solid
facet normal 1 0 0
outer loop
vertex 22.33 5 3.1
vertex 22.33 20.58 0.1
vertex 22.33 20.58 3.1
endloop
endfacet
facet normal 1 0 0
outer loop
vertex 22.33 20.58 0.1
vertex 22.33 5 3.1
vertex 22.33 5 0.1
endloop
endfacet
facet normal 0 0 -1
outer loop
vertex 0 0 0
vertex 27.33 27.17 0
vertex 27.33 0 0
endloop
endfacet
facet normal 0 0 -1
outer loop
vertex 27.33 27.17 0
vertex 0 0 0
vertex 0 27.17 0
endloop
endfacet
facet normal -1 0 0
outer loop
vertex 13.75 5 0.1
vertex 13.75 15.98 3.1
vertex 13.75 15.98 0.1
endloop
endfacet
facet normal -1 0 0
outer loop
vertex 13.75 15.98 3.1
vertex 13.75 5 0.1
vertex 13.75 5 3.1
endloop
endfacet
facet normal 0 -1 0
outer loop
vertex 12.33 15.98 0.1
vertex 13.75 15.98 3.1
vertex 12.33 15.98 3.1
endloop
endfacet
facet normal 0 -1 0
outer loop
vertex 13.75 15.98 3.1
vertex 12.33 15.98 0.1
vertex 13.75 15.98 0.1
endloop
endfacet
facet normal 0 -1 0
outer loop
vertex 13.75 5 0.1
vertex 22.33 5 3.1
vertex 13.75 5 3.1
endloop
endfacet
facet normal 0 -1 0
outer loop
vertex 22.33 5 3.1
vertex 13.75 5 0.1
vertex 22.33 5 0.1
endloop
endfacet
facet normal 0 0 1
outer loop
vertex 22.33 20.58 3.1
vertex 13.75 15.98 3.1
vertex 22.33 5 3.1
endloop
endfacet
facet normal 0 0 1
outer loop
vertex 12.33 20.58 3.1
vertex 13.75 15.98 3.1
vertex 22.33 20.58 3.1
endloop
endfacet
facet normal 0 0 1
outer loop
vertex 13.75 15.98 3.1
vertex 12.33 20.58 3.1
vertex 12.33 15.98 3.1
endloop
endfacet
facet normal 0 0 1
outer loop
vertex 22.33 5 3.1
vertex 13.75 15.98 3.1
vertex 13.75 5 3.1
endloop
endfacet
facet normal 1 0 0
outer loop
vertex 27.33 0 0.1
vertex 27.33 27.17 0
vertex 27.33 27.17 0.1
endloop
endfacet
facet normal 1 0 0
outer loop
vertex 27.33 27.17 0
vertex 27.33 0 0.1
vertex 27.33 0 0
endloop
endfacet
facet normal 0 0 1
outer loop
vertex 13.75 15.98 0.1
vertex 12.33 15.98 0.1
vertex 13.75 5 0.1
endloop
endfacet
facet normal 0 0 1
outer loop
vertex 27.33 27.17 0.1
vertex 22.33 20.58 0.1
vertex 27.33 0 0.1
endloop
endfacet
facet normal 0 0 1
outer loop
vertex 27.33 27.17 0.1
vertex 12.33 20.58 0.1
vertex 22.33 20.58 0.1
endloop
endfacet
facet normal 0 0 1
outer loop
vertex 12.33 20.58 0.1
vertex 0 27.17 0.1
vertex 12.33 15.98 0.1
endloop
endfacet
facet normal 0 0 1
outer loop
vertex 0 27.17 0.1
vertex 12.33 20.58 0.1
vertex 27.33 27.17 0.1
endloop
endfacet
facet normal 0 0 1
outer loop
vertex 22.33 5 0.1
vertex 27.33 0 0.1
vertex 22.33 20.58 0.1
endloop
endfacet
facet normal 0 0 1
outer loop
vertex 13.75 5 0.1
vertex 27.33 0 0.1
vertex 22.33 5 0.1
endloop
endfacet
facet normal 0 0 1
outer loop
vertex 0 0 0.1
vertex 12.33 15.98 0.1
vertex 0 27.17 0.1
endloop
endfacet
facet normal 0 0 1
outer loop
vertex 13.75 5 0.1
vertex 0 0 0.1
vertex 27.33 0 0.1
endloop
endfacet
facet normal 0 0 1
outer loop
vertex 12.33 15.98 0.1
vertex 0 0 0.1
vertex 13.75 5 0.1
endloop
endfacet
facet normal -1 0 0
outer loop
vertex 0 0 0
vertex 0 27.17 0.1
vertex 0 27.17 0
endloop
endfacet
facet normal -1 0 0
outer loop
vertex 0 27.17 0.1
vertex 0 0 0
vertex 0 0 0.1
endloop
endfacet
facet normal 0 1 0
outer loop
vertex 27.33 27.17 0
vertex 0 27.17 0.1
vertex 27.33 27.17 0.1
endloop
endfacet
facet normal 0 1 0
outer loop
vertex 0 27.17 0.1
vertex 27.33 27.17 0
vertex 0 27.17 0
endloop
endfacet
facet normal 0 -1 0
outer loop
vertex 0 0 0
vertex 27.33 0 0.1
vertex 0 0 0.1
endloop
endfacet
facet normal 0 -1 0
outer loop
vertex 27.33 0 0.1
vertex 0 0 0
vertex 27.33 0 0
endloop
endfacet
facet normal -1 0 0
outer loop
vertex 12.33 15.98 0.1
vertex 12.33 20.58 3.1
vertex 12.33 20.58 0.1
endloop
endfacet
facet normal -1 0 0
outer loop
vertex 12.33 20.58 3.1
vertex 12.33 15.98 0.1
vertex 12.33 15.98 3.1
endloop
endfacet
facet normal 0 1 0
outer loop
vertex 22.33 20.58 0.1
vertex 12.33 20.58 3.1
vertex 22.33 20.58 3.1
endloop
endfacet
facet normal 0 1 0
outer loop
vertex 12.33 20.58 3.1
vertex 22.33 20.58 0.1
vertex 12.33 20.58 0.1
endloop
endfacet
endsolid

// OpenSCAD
tla=27.33;
tlg=27.17;
dsud=5;
dest=5;
mla=8.58;
mhm=2.5;
mlg=10.98;
mhv=0.6;
gla=10;
glg=4.6;
ghm=mhm+mhv;

module maison()
{
	cube([mla,mlg,mhv]);
	translate([0,0,mhv])
		cube([mla,mlg,mhm]);
}

module garage()
{
	cube([gla,glg,ghm]);
}


module terrain()
{
	cube([tla,tlg,0.1]);
	translate([tla-mla-dest,dsud,0])
	{
		maison();
	}
	translate([tla-gla-dest,mlg+dsud,0])
	{
		garage();
	}
}

terrain();
